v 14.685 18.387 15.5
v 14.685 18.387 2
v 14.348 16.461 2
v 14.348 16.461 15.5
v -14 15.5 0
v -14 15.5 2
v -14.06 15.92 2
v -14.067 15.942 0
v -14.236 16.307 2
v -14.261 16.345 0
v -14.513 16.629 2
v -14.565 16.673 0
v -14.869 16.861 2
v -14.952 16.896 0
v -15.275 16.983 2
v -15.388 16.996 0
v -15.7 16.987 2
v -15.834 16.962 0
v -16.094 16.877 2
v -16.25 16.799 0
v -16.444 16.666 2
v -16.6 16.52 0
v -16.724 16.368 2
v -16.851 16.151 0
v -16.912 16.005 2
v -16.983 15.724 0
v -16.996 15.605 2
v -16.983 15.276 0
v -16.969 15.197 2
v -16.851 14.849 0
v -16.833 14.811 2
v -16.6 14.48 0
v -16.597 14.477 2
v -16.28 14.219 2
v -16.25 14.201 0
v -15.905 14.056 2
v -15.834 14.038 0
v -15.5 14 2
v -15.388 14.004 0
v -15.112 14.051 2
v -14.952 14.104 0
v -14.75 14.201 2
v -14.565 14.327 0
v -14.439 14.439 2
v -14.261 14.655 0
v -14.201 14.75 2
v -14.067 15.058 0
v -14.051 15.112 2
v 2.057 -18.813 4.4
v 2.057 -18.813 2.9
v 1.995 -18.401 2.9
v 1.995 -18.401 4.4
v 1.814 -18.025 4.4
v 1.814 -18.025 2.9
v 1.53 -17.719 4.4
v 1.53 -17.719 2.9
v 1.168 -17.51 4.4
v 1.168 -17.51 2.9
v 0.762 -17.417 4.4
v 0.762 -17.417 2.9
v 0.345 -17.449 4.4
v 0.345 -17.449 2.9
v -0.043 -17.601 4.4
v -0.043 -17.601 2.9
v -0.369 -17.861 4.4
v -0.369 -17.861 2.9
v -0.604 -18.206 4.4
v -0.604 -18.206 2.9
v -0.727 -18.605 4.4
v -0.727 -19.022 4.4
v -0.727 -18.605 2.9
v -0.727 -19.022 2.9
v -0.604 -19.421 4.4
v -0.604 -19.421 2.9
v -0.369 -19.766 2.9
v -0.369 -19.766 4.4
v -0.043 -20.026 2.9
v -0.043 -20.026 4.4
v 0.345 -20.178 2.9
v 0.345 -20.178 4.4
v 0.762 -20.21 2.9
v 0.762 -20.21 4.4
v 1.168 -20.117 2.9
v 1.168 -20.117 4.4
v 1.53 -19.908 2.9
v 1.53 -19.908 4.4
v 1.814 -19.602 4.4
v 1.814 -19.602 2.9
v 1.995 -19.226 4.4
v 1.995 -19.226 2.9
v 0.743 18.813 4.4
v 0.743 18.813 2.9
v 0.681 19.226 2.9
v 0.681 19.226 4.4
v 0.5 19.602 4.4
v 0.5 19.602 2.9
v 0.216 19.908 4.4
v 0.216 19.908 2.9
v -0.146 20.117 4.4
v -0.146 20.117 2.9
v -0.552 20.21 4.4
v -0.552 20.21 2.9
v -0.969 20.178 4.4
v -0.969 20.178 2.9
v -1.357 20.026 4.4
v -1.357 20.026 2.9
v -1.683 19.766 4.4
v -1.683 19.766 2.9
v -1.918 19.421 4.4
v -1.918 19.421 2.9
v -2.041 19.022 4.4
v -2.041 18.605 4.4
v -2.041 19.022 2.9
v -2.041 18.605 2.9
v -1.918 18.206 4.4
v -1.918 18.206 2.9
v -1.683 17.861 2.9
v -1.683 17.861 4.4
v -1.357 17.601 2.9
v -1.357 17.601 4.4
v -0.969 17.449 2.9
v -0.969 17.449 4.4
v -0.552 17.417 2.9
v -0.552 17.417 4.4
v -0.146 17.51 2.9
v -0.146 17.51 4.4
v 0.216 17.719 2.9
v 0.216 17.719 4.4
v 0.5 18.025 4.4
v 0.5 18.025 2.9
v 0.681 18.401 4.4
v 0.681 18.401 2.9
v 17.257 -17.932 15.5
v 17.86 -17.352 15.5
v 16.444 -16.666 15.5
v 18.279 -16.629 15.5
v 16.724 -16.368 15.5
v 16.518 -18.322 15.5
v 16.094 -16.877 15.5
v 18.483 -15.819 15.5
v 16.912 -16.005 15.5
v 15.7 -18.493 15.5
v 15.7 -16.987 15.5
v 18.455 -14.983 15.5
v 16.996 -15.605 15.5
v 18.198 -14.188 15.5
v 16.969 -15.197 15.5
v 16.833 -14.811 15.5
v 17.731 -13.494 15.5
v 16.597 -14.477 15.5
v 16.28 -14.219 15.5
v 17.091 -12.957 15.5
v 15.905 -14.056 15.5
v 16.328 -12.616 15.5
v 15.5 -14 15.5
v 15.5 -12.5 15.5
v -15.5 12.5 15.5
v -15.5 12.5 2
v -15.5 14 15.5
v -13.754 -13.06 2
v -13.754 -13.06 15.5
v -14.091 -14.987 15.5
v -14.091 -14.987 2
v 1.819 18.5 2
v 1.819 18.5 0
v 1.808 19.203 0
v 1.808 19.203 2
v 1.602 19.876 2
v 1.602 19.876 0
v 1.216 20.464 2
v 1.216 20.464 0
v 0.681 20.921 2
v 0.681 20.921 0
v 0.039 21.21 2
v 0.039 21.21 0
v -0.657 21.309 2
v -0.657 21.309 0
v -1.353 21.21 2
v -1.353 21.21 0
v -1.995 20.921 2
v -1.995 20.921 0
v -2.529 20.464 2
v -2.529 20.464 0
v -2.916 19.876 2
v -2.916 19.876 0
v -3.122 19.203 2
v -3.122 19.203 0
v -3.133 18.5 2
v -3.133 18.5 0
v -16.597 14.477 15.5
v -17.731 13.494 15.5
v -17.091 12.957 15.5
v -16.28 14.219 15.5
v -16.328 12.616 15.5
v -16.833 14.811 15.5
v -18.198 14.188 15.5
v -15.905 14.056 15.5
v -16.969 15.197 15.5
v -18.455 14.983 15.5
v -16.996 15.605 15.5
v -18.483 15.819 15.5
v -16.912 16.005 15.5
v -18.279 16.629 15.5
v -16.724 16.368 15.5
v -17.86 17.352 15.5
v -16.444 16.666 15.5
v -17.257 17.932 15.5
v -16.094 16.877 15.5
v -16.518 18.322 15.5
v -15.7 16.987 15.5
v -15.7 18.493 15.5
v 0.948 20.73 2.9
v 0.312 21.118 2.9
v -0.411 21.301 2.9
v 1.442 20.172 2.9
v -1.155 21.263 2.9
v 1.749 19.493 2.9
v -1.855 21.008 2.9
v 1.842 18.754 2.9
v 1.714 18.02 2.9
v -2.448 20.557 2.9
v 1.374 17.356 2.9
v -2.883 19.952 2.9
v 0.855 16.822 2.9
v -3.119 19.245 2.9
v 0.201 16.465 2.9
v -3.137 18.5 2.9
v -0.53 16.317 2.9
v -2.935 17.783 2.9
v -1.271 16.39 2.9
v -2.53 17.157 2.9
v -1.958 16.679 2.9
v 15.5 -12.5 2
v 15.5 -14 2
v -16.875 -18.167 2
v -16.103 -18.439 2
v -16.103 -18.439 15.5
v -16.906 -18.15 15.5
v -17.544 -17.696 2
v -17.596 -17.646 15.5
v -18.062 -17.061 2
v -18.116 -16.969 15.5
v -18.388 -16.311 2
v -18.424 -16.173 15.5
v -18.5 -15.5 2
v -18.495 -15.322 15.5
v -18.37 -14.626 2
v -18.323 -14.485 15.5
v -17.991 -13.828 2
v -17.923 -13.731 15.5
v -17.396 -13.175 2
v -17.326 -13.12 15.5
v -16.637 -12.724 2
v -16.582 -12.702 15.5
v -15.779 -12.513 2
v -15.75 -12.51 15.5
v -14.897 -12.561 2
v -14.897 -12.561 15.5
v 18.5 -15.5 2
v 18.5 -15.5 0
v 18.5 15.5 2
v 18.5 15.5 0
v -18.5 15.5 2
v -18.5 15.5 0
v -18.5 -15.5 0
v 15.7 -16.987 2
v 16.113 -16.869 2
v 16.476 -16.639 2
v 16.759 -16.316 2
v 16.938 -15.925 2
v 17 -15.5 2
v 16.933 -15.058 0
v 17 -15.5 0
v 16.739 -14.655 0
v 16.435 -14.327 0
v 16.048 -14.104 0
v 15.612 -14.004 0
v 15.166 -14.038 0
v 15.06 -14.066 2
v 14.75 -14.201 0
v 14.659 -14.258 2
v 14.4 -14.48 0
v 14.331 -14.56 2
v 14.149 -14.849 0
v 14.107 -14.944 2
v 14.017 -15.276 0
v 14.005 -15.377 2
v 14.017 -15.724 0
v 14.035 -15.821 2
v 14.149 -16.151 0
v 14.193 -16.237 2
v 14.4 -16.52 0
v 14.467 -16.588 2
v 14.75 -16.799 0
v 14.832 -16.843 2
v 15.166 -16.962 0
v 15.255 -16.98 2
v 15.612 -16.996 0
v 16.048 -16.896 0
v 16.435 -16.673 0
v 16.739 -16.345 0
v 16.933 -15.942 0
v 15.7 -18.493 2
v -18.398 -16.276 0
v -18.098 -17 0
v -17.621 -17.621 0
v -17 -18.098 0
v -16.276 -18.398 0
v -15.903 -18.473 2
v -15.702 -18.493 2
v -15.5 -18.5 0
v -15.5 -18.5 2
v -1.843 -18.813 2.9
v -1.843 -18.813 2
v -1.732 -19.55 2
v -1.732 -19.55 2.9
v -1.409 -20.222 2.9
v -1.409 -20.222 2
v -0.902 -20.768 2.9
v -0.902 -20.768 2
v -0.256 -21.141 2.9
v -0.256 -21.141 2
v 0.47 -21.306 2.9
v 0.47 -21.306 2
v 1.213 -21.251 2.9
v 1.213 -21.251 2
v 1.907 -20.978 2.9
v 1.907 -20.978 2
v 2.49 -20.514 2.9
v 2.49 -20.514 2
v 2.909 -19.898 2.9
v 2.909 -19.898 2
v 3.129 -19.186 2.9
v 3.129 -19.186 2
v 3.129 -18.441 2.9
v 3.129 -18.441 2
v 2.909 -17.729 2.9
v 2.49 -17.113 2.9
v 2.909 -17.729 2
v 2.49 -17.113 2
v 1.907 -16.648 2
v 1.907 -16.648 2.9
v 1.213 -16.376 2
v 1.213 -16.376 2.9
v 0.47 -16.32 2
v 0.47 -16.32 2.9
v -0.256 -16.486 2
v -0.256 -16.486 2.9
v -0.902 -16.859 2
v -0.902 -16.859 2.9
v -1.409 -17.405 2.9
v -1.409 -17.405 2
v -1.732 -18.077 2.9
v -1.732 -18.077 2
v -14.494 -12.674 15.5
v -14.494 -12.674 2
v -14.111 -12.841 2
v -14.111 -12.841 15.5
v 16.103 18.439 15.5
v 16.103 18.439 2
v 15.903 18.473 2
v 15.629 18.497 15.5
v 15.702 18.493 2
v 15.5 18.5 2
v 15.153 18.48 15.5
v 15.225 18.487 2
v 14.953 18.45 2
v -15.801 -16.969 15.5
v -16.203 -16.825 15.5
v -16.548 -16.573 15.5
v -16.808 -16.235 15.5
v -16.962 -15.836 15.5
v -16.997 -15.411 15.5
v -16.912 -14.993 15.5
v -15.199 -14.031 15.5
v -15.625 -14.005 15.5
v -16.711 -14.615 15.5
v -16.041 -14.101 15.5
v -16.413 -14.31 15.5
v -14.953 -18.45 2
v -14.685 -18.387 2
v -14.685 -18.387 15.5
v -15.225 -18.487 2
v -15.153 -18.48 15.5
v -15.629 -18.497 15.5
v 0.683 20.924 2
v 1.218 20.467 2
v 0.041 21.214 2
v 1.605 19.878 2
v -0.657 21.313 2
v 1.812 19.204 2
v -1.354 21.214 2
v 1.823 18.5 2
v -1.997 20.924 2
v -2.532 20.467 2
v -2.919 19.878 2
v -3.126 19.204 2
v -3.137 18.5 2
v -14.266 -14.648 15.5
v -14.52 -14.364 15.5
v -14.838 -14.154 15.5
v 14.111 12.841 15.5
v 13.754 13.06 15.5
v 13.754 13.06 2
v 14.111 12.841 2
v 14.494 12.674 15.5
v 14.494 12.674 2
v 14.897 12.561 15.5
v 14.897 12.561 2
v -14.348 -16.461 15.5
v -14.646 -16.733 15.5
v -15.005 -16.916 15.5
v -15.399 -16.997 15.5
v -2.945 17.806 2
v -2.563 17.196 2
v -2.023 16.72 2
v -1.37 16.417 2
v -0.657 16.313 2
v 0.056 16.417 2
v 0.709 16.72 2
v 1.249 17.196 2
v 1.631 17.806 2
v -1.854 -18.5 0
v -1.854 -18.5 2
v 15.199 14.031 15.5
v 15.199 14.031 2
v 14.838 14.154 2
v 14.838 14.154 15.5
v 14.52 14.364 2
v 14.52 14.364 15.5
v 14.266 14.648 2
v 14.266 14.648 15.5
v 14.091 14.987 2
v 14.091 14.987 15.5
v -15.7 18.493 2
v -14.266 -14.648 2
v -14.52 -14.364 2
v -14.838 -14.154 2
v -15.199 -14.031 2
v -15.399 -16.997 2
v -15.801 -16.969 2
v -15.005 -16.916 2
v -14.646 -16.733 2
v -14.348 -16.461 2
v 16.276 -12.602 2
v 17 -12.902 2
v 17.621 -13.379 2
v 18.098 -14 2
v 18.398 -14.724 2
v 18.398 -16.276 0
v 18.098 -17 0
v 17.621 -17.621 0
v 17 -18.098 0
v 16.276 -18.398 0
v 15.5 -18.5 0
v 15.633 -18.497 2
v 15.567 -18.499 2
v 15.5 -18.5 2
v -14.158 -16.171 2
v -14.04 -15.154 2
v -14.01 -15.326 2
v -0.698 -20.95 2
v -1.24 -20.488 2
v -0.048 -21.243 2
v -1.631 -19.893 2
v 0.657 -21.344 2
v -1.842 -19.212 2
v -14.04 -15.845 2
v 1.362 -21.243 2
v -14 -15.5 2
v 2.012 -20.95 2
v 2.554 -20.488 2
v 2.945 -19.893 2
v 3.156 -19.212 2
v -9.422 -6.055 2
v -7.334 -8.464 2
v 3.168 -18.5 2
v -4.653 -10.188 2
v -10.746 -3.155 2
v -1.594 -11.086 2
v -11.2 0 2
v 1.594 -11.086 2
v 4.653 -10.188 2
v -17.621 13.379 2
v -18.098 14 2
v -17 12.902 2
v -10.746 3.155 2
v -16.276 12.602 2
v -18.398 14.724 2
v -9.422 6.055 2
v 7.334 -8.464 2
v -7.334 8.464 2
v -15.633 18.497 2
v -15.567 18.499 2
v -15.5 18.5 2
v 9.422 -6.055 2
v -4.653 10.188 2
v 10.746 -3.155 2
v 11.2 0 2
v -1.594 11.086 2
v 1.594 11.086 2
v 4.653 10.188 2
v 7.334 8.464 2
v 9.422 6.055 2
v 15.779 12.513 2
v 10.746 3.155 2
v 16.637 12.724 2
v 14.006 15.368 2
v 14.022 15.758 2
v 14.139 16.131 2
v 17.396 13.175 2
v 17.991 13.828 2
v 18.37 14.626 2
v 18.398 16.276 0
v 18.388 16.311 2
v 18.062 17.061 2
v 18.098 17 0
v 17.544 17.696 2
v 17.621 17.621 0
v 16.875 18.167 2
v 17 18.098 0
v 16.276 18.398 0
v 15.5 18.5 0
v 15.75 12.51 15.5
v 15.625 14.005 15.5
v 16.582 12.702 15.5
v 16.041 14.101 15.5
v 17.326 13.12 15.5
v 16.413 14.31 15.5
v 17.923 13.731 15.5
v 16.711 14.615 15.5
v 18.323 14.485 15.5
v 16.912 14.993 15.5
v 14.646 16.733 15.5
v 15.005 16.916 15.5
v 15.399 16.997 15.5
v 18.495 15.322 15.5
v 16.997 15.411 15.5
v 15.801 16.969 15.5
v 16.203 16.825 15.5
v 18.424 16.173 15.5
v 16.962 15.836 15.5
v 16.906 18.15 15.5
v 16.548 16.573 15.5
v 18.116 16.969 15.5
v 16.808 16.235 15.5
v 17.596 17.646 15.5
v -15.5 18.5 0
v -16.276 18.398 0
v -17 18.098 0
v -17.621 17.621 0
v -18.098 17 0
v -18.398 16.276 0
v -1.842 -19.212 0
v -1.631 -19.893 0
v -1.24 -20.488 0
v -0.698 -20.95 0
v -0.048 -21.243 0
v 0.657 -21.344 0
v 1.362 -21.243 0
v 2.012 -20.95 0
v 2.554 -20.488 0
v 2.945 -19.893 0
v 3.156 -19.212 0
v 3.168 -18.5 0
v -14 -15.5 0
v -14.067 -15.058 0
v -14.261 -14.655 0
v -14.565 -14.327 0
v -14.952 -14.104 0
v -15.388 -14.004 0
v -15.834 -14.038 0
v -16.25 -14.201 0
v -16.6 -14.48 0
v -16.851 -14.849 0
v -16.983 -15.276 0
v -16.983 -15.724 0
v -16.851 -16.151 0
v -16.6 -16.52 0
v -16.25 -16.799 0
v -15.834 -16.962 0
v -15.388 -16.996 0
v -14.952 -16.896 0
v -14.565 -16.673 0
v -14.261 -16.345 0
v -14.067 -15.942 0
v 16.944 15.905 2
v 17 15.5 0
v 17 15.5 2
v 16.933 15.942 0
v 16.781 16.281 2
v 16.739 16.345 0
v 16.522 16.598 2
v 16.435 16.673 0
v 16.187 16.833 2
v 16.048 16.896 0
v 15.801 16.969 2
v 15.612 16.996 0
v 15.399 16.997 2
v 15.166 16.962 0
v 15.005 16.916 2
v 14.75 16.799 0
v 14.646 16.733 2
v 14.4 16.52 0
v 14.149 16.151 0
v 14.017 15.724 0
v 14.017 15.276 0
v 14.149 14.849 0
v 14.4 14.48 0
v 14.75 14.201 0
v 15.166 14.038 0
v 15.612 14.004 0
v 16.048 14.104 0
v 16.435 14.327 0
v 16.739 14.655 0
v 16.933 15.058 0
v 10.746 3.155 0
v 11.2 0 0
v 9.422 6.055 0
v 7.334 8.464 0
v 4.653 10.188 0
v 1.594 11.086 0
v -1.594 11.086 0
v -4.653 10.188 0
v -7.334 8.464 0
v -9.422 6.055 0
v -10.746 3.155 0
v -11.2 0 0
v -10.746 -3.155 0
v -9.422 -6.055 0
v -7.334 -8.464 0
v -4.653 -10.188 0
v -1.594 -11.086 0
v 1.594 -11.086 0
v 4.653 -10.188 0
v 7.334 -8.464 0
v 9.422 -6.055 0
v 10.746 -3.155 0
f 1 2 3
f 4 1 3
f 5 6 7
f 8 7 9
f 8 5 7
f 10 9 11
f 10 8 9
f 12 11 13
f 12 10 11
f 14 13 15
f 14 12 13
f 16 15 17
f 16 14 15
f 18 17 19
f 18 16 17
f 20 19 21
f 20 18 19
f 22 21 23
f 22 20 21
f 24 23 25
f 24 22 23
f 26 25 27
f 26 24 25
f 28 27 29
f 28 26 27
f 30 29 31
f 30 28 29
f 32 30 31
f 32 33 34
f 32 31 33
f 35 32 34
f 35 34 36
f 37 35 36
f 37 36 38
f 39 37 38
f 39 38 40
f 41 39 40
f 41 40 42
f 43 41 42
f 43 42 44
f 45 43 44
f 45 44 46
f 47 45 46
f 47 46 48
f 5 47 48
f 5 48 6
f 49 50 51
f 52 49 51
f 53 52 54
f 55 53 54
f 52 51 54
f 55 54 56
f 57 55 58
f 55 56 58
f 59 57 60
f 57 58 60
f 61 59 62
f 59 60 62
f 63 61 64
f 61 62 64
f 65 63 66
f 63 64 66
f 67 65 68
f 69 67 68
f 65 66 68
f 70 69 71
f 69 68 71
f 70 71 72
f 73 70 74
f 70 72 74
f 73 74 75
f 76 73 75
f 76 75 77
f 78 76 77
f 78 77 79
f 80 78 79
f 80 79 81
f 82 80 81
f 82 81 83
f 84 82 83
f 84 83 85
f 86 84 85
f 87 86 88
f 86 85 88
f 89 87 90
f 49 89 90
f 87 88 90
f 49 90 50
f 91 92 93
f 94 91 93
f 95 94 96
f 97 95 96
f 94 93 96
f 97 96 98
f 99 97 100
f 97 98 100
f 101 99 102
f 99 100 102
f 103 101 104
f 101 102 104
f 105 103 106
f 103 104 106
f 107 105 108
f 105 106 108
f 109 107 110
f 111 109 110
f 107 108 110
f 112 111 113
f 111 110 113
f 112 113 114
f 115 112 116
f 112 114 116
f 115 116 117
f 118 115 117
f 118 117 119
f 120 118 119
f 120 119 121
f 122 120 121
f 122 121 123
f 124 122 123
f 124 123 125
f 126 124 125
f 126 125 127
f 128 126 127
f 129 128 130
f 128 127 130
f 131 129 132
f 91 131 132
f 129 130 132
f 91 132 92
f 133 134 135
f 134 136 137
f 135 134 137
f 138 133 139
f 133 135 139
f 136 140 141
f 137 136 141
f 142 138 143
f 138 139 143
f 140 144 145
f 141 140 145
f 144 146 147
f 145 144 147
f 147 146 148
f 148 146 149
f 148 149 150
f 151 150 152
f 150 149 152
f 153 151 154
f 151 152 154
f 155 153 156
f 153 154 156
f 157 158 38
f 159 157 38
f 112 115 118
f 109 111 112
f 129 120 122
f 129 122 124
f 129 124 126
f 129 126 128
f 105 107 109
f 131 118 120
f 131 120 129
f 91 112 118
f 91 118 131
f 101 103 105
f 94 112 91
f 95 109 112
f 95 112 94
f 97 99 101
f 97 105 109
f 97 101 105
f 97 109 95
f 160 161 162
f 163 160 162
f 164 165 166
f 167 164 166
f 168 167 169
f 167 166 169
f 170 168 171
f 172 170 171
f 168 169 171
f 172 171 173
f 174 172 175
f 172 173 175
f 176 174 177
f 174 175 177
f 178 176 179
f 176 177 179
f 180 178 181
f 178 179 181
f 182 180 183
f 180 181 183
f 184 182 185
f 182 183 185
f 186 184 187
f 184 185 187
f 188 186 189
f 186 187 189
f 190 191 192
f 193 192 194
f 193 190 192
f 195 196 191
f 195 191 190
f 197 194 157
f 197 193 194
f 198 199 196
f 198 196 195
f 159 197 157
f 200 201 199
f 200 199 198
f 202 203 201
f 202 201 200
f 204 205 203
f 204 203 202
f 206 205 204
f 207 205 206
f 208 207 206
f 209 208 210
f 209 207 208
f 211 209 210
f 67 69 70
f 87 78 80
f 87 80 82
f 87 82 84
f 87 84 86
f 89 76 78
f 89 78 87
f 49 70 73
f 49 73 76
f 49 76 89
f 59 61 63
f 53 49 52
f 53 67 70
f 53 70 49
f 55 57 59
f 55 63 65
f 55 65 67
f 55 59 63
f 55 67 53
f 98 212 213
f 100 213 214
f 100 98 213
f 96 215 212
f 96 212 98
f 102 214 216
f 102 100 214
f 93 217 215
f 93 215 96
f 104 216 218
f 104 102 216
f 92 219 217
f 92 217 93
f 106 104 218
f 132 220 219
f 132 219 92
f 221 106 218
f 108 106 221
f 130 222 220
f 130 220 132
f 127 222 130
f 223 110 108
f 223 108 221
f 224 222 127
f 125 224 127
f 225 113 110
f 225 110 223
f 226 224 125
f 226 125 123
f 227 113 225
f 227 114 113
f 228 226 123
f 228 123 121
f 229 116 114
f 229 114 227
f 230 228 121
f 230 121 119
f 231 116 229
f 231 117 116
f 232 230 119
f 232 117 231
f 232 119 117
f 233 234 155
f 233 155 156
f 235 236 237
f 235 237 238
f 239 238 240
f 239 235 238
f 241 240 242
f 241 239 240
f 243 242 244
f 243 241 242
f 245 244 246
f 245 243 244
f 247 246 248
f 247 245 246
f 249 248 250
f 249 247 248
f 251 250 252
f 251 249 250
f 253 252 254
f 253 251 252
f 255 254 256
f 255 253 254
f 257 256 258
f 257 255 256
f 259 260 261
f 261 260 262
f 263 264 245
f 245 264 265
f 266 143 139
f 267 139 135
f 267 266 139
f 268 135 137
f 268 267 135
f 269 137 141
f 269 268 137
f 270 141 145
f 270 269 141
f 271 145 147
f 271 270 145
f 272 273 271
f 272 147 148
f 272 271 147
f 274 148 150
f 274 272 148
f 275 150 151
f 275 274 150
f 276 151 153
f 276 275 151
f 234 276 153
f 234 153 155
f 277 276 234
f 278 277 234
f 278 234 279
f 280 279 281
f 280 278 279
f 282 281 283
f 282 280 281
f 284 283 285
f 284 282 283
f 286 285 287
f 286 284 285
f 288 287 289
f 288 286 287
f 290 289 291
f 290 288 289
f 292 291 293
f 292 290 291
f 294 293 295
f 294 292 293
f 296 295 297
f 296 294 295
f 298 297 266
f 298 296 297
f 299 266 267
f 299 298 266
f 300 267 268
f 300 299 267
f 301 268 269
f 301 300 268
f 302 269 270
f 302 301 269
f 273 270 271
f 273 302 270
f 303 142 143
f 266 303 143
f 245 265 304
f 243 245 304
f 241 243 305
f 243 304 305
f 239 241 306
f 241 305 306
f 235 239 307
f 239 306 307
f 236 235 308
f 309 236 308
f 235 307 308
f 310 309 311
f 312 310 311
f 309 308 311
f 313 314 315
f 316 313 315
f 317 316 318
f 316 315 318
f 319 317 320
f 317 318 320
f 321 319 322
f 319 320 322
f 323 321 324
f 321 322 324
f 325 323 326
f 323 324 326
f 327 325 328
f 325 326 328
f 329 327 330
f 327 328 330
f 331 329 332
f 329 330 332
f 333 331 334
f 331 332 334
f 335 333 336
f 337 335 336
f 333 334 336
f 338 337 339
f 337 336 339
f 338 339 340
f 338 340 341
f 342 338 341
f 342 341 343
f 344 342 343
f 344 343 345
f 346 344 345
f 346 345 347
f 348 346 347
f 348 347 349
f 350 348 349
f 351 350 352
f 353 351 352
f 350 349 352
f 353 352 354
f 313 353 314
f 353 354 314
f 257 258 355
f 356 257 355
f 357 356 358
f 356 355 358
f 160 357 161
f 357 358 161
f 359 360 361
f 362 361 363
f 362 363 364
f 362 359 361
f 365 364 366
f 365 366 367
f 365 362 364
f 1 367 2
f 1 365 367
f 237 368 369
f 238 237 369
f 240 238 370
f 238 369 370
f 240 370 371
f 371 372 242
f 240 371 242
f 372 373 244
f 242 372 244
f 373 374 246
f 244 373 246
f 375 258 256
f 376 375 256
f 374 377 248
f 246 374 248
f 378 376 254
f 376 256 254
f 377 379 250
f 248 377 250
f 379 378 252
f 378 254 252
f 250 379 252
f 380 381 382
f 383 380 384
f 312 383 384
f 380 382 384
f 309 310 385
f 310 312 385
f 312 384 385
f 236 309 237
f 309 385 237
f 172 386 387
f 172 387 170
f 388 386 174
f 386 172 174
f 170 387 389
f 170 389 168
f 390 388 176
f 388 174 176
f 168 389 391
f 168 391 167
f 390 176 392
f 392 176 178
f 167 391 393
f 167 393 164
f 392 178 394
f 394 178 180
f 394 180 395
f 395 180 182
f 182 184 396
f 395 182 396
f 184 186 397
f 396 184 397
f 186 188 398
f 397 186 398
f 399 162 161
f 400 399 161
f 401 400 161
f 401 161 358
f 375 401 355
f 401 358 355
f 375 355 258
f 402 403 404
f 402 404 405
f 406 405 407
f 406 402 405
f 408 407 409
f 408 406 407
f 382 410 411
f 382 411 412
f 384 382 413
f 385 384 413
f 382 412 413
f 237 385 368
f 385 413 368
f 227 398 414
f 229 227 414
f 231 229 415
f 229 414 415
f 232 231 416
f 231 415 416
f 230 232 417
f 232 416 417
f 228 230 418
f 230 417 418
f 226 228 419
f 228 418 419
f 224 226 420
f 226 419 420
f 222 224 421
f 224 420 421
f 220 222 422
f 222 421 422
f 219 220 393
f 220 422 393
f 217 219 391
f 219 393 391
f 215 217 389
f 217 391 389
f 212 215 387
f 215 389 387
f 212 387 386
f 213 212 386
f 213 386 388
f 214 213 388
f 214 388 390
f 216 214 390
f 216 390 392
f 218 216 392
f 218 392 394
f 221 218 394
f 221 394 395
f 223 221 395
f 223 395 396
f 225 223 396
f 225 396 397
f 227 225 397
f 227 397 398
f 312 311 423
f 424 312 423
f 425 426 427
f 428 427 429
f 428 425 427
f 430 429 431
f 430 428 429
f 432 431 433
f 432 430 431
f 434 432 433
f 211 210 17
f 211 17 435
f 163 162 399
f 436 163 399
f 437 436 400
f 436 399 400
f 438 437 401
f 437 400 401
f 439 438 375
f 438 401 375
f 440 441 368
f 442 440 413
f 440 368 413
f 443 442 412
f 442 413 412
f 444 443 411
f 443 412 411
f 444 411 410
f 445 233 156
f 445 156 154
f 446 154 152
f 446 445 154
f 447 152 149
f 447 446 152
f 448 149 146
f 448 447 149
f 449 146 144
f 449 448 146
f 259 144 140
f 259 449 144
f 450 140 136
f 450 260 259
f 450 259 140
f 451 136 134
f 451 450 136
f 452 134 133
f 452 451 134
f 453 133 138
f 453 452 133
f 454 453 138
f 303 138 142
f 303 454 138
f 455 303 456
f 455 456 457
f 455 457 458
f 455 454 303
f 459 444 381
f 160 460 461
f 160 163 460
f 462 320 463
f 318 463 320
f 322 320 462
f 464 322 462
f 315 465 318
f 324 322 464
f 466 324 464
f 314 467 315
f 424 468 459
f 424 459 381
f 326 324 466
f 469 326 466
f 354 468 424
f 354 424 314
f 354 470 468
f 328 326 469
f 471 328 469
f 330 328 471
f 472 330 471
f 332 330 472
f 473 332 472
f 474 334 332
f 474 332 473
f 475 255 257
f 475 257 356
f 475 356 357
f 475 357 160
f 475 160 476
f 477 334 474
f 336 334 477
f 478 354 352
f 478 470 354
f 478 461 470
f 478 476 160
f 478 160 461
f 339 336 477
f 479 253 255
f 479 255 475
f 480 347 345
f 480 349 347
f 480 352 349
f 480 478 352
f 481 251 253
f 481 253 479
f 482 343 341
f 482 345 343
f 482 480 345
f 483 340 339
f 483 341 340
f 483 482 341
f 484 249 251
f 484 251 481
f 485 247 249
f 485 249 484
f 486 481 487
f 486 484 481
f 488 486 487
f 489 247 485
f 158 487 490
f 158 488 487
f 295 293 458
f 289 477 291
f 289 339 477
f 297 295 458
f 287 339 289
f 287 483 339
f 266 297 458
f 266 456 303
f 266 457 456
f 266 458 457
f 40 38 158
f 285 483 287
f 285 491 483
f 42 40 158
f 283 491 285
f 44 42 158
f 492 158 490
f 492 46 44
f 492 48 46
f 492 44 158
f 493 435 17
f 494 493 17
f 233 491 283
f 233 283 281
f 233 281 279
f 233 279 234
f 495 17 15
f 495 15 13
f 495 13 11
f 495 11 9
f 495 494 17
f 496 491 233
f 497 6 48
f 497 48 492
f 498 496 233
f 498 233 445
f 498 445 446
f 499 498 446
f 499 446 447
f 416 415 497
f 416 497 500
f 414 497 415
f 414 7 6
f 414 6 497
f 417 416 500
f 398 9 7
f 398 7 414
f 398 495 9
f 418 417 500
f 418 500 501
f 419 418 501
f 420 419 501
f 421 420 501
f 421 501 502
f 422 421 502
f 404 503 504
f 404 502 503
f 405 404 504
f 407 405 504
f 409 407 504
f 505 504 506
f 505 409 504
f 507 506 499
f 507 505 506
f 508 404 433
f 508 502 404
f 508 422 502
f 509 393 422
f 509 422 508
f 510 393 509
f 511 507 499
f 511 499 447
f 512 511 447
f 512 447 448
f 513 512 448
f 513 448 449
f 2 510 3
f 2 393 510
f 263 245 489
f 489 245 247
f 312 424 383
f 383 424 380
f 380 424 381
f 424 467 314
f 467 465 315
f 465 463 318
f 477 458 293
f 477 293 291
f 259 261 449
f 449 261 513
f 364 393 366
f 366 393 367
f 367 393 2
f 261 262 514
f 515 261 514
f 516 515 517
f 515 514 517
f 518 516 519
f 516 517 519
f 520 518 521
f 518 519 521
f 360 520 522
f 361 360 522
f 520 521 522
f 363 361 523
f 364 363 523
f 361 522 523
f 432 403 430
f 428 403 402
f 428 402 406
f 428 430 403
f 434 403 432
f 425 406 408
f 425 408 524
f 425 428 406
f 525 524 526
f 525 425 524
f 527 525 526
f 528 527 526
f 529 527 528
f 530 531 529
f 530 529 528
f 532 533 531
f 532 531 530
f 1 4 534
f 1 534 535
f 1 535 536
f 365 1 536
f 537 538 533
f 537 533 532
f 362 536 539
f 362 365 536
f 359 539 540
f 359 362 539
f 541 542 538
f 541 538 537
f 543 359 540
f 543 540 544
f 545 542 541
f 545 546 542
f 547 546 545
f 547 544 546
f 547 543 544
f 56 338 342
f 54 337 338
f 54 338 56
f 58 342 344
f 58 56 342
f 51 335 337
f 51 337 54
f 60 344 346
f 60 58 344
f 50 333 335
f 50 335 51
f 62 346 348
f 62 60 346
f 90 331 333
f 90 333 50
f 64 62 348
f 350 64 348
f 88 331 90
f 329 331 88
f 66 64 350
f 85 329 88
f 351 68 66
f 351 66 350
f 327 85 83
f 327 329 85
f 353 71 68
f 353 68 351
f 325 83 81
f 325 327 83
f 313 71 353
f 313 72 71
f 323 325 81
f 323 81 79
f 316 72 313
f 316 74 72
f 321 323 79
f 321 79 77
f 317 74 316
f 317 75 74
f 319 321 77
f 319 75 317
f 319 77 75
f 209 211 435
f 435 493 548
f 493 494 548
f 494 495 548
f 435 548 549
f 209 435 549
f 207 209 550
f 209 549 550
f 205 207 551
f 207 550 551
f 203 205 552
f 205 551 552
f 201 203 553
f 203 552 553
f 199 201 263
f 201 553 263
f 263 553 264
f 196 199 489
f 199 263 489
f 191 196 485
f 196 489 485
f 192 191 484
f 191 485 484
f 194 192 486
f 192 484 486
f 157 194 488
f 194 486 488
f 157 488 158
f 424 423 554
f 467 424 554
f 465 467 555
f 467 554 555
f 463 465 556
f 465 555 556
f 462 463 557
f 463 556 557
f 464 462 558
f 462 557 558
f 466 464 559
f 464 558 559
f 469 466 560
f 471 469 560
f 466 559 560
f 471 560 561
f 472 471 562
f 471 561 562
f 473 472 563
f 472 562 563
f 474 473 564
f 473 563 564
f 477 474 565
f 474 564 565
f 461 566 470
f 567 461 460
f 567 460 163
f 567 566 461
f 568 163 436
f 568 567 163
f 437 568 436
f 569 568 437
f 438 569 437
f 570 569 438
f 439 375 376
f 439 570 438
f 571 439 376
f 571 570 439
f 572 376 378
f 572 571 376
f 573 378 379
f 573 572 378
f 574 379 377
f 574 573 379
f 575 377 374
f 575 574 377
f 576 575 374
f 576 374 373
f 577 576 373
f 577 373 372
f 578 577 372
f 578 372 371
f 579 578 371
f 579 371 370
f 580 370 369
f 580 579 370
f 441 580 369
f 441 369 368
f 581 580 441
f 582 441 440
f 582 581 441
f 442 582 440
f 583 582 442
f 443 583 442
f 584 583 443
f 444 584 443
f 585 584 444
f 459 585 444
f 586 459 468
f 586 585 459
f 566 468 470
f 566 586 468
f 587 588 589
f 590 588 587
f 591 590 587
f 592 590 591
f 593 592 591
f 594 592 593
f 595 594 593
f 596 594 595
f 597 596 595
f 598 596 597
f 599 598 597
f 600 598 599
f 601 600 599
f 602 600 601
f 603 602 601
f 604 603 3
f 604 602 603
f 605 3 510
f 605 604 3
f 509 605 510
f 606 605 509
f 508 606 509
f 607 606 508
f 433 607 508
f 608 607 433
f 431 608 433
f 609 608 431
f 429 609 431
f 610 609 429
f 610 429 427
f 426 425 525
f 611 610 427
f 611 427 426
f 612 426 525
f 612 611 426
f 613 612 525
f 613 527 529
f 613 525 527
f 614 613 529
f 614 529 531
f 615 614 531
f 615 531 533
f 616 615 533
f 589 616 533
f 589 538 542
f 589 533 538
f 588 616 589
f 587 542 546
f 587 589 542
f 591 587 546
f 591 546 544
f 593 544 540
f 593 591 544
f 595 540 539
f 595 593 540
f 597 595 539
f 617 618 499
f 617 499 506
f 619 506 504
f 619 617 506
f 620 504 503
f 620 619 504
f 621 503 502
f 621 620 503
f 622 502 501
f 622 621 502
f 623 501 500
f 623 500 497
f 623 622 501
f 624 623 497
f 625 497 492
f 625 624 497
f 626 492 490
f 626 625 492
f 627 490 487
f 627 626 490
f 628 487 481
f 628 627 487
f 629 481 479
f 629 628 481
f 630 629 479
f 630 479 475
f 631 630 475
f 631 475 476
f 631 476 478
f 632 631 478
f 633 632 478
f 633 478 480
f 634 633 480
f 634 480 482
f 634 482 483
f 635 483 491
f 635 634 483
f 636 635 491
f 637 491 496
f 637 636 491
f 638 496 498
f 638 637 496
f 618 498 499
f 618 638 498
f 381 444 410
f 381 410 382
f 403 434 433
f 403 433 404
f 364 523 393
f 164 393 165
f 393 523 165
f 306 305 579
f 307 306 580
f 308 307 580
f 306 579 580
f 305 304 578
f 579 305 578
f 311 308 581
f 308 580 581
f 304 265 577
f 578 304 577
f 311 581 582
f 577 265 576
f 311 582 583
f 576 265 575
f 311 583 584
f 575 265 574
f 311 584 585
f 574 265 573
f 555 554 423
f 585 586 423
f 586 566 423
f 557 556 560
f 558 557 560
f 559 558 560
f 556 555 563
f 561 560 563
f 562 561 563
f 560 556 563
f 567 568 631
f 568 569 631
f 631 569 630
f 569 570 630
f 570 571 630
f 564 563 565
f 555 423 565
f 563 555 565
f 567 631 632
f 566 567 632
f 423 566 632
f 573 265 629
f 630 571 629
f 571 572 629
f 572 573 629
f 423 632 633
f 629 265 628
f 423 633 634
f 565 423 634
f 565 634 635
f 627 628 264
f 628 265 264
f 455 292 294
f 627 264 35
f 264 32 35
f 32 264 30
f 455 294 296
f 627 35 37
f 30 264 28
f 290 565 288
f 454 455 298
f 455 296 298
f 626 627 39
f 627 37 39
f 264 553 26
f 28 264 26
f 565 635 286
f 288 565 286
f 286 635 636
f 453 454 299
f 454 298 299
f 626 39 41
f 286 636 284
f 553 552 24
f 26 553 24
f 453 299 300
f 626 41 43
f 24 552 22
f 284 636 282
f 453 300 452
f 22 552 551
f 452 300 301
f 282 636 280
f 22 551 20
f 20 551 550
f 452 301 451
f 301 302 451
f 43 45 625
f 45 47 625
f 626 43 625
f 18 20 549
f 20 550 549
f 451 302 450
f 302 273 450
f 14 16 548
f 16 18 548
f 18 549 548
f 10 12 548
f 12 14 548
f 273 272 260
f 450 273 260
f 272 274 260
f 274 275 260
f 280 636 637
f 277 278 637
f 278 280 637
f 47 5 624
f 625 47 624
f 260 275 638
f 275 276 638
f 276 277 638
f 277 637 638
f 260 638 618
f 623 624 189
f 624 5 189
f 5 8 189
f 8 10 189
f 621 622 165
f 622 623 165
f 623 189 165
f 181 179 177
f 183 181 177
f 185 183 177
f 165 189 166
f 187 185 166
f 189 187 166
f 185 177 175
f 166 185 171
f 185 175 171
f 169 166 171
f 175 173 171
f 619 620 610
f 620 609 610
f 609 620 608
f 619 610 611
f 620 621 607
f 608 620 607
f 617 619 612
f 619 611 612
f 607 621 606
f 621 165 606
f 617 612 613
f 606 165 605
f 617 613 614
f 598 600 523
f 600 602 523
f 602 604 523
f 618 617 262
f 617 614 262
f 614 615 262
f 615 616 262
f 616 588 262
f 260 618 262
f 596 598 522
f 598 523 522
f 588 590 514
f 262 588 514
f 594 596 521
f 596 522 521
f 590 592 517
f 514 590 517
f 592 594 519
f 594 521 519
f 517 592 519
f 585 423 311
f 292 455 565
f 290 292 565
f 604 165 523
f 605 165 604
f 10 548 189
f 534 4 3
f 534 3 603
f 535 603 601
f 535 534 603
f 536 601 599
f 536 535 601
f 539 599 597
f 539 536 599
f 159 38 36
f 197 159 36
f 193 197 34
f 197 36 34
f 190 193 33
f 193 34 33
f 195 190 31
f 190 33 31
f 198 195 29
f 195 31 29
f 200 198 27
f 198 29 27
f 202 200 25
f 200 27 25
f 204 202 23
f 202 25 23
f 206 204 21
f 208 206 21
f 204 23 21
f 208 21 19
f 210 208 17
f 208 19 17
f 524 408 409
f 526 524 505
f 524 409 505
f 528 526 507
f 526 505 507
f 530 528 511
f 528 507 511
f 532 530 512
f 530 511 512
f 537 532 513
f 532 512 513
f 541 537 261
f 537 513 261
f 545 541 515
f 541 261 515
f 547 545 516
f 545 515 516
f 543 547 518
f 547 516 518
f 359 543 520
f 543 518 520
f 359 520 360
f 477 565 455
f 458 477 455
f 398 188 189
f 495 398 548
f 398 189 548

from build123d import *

# Parameters (mm, degrees)
SKETCH1_R      = 1.5
SKETCH1_R_2    = 11.2
EXTRUDE1_DEPTH = 2
SKETCH2_R      = 2.5
EXTRUDE2_DEPTH = 0.9
SKETCH3_R      = 1.4
EXTRUDE3_DEPTH = 1.5
EXTRUDE4_DEPTH = 13.5
EXTRUDE5_DEPTH = 13.5
SKETCH6_W      = 0.2
SKETCH6_H      = 4.339086574
EXTRUDE6_DEPTH = 13.5


with BuildPart() as part:
    # Sketch1 → Extrude1 (new body)
    with BuildSketch(Plane.XY):
        with BuildLine():
            Line((-18.5, 15.5), (-18.5, -15.5))
            ThreePointArc((-18.5, -15.5), (-17.621320344, -17.621320344), (-15.5, -18.5))
            Line((-15.5, -18.5), (-1.853762559, -18.5))
            ThreePointArc((-1.853762559, -18.5), (0.656979507, -21.34366179), (3.167721572, -18.5))
            Line((3.167721572, -18.5), (15.5, -18.5))
            ThreePointArc((15.5, -18.5), (17.621320344, -17.621320344), (18.5, -15.5))
            Line((18.5, -15.5), (18.5, 15.5))
            ThreePointArc((18.5, 15.5), (17.621320344, 17.621320344), (15.5, 18.5))
            Line((15.5, 18.5), (1.819299557, 18.5))
            ThreePointArc((1.819299557, 18.5), (-0.656979507, 21.309467878), (-3.13325857, 18.5))
            Line((-3.13325857, 18.5), (-15.5, 18.5))
            ThreePointArc((-15.5, 18.5), (-17.621320344, 17.621320344), (-18.5, 15.5))
        make_face()
        with Locations((15.5, 15.5)):
            Circle(SKETCH1_R, mode=Mode.SUBTRACT)
        with Locations((-15.5, 15.5)):
            Circle(SKETCH1_R, mode=Mode.SUBTRACT)
        Circle(SKETCH1_R_2, mode=Mode.SUBTRACT)
        with Locations((15.5, -15.5)):
            Circle(SKETCH1_R, mode=Mode.SUBTRACT)
        with Locations((-15.5, -15.5)):
            Circle(SKETCH1_R, mode=Mode.SUBTRACT)
    extrude(amount=EXTRUDE1_DEPTH)

    # Sketch2 → Extrude2 (add)
    with BuildSketch(Plane.XY.offset(2)):
        with Locations(Location((-0.656979507, 18.813431552, 0), (0, 0, 187.202274666))):
            Circle(SKETCH2_R)
        with Locations(Location((0.656979507, -18.813431552, 0), (0, 0, 180))):
            Circle(SKETCH2_R)
    extrude(amount=EXTRUDE2_DEPTH)

    # Sketch3 → Extrude3 (add)
    with BuildSketch(Plane.XY.offset(2.9)):
        with Locations((-0.656979507, 18.813431552)):
            Circle(SKETCH3_R)
        with Locations((0.656979507, -18.813431552)):
            Circle(SKETCH3_R)
    extrude(amount=EXTRUDE3_DEPTH)

    # Sketch4 → Extrude4 (add)
    with BuildSketch(Plane.XY.offset(2)):
        with BuildLine():
            Line((15.5, -14), (15.5, -12.5))
            ThreePointArc((15.5, -12.5), (18.5, -15.5), (15.5, -18.5))
            Line((15.5, -18.5), (15.5, -17))
            ThreePointArc((15.5, -17), (17, -15.5), (15.5, -14))
        make_face()
        with BuildLine():
            Line((-14.897310813, -12.561162518), (-15.198655407, -14.030581259))
            ThreePointArc((-15.198655407, -14.030581259), (-16.969418741, -15.198655407), (-15.801344593, -16.969418741))
            Line((-15.801344593, -16.969418741), (-16.102689187, -18.438837482))
            ThreePointArc((-16.102689187, -18.438837482), (-18.438837482, -14.897310813), (-14.897310813, -12.561162518))
        make_face()
        with BuildLine():
            Line((-15.5, 17), (-15.5, 18.5))
            ThreePointArc((-15.5, 18.5), (-18.5, 15.5), (-15.5, 12.5))
            Line((-15.5, 12.5), (-15.5, 14))
            ThreePointArc((-15.5, 14), (-17, 15.5), (-15.5, 17))
        make_face()
        with BuildLine():
            Line((16.102689187, 18.438837482), (15.801344593, 16.969418741))
            ThreePointArc((15.801344593, 16.969418741), (16.969418741, 15.198655407), (15.198655407, 14.030581259))
            Line((15.198655407, 14.030581259), (14.897310813, 12.561162518))
            ThreePointArc((14.897310813, 12.561162518), (18.438837482, 14.897310813), (16.102689187, 18.438837482))
        make_face()
    extrude(amount=EXTRUDE4_DEPTH)

    # Sketch5 → Extrude5 (add)
    with BuildSketch(Plane.XY.offset(15.5)):
        with BuildLine():
            Line((14.684749395, 18.387103471), (14.348199746, 16.460914239))
            ThreePointArc((14.348199746, 16.460914239), (16.977615135, 15.241826583), (14.090600687, 14.98658635))
            Line((14.090600687, 14.98658635), (13.754051037, 13.060397118))
            ThreePointArc((13.754051037, 13.060397118), (18.45523027, 14.983653166), (14.684749395, 18.387103471))
        make_face()
        with BuildLine():
            Line((-13.754051037, -13.060397118), (-14.090600687, -14.98658635))
            ThreePointArc((-14.090600687, -14.98658635), (-16.977615135, -15.241826583), (-14.348199746, -16.460914239))
            Line((-14.348199746, -16.460914239), (-14.684749395, -18.387103471))
            ThreePointArc((-14.684749395, -18.387103471), (-18.45523027, -14.983653166), (-13.754051037, -13.060397118))
        make_face()
    extrude(amount=-EXTRUDE5_DEPTH)

    # Sketch6 → Extrude6 (cut)
    with BuildSketch(Plane.XY.offset(15.5)):
        Polygon((-15.5, 19.617766956), (-15.5, 15.861892736), (-15.7, 15.875), (-15.7, 19.617766956), align=None)
        with Locations((15.6, -18.094430424)):
            Rectangle(SKETCH6_W, SKETCH6_H)
    extrude(amount=-EXTRUDE6_DEPTH, mode=Mode.SUBTRACT)


solid = part.part
